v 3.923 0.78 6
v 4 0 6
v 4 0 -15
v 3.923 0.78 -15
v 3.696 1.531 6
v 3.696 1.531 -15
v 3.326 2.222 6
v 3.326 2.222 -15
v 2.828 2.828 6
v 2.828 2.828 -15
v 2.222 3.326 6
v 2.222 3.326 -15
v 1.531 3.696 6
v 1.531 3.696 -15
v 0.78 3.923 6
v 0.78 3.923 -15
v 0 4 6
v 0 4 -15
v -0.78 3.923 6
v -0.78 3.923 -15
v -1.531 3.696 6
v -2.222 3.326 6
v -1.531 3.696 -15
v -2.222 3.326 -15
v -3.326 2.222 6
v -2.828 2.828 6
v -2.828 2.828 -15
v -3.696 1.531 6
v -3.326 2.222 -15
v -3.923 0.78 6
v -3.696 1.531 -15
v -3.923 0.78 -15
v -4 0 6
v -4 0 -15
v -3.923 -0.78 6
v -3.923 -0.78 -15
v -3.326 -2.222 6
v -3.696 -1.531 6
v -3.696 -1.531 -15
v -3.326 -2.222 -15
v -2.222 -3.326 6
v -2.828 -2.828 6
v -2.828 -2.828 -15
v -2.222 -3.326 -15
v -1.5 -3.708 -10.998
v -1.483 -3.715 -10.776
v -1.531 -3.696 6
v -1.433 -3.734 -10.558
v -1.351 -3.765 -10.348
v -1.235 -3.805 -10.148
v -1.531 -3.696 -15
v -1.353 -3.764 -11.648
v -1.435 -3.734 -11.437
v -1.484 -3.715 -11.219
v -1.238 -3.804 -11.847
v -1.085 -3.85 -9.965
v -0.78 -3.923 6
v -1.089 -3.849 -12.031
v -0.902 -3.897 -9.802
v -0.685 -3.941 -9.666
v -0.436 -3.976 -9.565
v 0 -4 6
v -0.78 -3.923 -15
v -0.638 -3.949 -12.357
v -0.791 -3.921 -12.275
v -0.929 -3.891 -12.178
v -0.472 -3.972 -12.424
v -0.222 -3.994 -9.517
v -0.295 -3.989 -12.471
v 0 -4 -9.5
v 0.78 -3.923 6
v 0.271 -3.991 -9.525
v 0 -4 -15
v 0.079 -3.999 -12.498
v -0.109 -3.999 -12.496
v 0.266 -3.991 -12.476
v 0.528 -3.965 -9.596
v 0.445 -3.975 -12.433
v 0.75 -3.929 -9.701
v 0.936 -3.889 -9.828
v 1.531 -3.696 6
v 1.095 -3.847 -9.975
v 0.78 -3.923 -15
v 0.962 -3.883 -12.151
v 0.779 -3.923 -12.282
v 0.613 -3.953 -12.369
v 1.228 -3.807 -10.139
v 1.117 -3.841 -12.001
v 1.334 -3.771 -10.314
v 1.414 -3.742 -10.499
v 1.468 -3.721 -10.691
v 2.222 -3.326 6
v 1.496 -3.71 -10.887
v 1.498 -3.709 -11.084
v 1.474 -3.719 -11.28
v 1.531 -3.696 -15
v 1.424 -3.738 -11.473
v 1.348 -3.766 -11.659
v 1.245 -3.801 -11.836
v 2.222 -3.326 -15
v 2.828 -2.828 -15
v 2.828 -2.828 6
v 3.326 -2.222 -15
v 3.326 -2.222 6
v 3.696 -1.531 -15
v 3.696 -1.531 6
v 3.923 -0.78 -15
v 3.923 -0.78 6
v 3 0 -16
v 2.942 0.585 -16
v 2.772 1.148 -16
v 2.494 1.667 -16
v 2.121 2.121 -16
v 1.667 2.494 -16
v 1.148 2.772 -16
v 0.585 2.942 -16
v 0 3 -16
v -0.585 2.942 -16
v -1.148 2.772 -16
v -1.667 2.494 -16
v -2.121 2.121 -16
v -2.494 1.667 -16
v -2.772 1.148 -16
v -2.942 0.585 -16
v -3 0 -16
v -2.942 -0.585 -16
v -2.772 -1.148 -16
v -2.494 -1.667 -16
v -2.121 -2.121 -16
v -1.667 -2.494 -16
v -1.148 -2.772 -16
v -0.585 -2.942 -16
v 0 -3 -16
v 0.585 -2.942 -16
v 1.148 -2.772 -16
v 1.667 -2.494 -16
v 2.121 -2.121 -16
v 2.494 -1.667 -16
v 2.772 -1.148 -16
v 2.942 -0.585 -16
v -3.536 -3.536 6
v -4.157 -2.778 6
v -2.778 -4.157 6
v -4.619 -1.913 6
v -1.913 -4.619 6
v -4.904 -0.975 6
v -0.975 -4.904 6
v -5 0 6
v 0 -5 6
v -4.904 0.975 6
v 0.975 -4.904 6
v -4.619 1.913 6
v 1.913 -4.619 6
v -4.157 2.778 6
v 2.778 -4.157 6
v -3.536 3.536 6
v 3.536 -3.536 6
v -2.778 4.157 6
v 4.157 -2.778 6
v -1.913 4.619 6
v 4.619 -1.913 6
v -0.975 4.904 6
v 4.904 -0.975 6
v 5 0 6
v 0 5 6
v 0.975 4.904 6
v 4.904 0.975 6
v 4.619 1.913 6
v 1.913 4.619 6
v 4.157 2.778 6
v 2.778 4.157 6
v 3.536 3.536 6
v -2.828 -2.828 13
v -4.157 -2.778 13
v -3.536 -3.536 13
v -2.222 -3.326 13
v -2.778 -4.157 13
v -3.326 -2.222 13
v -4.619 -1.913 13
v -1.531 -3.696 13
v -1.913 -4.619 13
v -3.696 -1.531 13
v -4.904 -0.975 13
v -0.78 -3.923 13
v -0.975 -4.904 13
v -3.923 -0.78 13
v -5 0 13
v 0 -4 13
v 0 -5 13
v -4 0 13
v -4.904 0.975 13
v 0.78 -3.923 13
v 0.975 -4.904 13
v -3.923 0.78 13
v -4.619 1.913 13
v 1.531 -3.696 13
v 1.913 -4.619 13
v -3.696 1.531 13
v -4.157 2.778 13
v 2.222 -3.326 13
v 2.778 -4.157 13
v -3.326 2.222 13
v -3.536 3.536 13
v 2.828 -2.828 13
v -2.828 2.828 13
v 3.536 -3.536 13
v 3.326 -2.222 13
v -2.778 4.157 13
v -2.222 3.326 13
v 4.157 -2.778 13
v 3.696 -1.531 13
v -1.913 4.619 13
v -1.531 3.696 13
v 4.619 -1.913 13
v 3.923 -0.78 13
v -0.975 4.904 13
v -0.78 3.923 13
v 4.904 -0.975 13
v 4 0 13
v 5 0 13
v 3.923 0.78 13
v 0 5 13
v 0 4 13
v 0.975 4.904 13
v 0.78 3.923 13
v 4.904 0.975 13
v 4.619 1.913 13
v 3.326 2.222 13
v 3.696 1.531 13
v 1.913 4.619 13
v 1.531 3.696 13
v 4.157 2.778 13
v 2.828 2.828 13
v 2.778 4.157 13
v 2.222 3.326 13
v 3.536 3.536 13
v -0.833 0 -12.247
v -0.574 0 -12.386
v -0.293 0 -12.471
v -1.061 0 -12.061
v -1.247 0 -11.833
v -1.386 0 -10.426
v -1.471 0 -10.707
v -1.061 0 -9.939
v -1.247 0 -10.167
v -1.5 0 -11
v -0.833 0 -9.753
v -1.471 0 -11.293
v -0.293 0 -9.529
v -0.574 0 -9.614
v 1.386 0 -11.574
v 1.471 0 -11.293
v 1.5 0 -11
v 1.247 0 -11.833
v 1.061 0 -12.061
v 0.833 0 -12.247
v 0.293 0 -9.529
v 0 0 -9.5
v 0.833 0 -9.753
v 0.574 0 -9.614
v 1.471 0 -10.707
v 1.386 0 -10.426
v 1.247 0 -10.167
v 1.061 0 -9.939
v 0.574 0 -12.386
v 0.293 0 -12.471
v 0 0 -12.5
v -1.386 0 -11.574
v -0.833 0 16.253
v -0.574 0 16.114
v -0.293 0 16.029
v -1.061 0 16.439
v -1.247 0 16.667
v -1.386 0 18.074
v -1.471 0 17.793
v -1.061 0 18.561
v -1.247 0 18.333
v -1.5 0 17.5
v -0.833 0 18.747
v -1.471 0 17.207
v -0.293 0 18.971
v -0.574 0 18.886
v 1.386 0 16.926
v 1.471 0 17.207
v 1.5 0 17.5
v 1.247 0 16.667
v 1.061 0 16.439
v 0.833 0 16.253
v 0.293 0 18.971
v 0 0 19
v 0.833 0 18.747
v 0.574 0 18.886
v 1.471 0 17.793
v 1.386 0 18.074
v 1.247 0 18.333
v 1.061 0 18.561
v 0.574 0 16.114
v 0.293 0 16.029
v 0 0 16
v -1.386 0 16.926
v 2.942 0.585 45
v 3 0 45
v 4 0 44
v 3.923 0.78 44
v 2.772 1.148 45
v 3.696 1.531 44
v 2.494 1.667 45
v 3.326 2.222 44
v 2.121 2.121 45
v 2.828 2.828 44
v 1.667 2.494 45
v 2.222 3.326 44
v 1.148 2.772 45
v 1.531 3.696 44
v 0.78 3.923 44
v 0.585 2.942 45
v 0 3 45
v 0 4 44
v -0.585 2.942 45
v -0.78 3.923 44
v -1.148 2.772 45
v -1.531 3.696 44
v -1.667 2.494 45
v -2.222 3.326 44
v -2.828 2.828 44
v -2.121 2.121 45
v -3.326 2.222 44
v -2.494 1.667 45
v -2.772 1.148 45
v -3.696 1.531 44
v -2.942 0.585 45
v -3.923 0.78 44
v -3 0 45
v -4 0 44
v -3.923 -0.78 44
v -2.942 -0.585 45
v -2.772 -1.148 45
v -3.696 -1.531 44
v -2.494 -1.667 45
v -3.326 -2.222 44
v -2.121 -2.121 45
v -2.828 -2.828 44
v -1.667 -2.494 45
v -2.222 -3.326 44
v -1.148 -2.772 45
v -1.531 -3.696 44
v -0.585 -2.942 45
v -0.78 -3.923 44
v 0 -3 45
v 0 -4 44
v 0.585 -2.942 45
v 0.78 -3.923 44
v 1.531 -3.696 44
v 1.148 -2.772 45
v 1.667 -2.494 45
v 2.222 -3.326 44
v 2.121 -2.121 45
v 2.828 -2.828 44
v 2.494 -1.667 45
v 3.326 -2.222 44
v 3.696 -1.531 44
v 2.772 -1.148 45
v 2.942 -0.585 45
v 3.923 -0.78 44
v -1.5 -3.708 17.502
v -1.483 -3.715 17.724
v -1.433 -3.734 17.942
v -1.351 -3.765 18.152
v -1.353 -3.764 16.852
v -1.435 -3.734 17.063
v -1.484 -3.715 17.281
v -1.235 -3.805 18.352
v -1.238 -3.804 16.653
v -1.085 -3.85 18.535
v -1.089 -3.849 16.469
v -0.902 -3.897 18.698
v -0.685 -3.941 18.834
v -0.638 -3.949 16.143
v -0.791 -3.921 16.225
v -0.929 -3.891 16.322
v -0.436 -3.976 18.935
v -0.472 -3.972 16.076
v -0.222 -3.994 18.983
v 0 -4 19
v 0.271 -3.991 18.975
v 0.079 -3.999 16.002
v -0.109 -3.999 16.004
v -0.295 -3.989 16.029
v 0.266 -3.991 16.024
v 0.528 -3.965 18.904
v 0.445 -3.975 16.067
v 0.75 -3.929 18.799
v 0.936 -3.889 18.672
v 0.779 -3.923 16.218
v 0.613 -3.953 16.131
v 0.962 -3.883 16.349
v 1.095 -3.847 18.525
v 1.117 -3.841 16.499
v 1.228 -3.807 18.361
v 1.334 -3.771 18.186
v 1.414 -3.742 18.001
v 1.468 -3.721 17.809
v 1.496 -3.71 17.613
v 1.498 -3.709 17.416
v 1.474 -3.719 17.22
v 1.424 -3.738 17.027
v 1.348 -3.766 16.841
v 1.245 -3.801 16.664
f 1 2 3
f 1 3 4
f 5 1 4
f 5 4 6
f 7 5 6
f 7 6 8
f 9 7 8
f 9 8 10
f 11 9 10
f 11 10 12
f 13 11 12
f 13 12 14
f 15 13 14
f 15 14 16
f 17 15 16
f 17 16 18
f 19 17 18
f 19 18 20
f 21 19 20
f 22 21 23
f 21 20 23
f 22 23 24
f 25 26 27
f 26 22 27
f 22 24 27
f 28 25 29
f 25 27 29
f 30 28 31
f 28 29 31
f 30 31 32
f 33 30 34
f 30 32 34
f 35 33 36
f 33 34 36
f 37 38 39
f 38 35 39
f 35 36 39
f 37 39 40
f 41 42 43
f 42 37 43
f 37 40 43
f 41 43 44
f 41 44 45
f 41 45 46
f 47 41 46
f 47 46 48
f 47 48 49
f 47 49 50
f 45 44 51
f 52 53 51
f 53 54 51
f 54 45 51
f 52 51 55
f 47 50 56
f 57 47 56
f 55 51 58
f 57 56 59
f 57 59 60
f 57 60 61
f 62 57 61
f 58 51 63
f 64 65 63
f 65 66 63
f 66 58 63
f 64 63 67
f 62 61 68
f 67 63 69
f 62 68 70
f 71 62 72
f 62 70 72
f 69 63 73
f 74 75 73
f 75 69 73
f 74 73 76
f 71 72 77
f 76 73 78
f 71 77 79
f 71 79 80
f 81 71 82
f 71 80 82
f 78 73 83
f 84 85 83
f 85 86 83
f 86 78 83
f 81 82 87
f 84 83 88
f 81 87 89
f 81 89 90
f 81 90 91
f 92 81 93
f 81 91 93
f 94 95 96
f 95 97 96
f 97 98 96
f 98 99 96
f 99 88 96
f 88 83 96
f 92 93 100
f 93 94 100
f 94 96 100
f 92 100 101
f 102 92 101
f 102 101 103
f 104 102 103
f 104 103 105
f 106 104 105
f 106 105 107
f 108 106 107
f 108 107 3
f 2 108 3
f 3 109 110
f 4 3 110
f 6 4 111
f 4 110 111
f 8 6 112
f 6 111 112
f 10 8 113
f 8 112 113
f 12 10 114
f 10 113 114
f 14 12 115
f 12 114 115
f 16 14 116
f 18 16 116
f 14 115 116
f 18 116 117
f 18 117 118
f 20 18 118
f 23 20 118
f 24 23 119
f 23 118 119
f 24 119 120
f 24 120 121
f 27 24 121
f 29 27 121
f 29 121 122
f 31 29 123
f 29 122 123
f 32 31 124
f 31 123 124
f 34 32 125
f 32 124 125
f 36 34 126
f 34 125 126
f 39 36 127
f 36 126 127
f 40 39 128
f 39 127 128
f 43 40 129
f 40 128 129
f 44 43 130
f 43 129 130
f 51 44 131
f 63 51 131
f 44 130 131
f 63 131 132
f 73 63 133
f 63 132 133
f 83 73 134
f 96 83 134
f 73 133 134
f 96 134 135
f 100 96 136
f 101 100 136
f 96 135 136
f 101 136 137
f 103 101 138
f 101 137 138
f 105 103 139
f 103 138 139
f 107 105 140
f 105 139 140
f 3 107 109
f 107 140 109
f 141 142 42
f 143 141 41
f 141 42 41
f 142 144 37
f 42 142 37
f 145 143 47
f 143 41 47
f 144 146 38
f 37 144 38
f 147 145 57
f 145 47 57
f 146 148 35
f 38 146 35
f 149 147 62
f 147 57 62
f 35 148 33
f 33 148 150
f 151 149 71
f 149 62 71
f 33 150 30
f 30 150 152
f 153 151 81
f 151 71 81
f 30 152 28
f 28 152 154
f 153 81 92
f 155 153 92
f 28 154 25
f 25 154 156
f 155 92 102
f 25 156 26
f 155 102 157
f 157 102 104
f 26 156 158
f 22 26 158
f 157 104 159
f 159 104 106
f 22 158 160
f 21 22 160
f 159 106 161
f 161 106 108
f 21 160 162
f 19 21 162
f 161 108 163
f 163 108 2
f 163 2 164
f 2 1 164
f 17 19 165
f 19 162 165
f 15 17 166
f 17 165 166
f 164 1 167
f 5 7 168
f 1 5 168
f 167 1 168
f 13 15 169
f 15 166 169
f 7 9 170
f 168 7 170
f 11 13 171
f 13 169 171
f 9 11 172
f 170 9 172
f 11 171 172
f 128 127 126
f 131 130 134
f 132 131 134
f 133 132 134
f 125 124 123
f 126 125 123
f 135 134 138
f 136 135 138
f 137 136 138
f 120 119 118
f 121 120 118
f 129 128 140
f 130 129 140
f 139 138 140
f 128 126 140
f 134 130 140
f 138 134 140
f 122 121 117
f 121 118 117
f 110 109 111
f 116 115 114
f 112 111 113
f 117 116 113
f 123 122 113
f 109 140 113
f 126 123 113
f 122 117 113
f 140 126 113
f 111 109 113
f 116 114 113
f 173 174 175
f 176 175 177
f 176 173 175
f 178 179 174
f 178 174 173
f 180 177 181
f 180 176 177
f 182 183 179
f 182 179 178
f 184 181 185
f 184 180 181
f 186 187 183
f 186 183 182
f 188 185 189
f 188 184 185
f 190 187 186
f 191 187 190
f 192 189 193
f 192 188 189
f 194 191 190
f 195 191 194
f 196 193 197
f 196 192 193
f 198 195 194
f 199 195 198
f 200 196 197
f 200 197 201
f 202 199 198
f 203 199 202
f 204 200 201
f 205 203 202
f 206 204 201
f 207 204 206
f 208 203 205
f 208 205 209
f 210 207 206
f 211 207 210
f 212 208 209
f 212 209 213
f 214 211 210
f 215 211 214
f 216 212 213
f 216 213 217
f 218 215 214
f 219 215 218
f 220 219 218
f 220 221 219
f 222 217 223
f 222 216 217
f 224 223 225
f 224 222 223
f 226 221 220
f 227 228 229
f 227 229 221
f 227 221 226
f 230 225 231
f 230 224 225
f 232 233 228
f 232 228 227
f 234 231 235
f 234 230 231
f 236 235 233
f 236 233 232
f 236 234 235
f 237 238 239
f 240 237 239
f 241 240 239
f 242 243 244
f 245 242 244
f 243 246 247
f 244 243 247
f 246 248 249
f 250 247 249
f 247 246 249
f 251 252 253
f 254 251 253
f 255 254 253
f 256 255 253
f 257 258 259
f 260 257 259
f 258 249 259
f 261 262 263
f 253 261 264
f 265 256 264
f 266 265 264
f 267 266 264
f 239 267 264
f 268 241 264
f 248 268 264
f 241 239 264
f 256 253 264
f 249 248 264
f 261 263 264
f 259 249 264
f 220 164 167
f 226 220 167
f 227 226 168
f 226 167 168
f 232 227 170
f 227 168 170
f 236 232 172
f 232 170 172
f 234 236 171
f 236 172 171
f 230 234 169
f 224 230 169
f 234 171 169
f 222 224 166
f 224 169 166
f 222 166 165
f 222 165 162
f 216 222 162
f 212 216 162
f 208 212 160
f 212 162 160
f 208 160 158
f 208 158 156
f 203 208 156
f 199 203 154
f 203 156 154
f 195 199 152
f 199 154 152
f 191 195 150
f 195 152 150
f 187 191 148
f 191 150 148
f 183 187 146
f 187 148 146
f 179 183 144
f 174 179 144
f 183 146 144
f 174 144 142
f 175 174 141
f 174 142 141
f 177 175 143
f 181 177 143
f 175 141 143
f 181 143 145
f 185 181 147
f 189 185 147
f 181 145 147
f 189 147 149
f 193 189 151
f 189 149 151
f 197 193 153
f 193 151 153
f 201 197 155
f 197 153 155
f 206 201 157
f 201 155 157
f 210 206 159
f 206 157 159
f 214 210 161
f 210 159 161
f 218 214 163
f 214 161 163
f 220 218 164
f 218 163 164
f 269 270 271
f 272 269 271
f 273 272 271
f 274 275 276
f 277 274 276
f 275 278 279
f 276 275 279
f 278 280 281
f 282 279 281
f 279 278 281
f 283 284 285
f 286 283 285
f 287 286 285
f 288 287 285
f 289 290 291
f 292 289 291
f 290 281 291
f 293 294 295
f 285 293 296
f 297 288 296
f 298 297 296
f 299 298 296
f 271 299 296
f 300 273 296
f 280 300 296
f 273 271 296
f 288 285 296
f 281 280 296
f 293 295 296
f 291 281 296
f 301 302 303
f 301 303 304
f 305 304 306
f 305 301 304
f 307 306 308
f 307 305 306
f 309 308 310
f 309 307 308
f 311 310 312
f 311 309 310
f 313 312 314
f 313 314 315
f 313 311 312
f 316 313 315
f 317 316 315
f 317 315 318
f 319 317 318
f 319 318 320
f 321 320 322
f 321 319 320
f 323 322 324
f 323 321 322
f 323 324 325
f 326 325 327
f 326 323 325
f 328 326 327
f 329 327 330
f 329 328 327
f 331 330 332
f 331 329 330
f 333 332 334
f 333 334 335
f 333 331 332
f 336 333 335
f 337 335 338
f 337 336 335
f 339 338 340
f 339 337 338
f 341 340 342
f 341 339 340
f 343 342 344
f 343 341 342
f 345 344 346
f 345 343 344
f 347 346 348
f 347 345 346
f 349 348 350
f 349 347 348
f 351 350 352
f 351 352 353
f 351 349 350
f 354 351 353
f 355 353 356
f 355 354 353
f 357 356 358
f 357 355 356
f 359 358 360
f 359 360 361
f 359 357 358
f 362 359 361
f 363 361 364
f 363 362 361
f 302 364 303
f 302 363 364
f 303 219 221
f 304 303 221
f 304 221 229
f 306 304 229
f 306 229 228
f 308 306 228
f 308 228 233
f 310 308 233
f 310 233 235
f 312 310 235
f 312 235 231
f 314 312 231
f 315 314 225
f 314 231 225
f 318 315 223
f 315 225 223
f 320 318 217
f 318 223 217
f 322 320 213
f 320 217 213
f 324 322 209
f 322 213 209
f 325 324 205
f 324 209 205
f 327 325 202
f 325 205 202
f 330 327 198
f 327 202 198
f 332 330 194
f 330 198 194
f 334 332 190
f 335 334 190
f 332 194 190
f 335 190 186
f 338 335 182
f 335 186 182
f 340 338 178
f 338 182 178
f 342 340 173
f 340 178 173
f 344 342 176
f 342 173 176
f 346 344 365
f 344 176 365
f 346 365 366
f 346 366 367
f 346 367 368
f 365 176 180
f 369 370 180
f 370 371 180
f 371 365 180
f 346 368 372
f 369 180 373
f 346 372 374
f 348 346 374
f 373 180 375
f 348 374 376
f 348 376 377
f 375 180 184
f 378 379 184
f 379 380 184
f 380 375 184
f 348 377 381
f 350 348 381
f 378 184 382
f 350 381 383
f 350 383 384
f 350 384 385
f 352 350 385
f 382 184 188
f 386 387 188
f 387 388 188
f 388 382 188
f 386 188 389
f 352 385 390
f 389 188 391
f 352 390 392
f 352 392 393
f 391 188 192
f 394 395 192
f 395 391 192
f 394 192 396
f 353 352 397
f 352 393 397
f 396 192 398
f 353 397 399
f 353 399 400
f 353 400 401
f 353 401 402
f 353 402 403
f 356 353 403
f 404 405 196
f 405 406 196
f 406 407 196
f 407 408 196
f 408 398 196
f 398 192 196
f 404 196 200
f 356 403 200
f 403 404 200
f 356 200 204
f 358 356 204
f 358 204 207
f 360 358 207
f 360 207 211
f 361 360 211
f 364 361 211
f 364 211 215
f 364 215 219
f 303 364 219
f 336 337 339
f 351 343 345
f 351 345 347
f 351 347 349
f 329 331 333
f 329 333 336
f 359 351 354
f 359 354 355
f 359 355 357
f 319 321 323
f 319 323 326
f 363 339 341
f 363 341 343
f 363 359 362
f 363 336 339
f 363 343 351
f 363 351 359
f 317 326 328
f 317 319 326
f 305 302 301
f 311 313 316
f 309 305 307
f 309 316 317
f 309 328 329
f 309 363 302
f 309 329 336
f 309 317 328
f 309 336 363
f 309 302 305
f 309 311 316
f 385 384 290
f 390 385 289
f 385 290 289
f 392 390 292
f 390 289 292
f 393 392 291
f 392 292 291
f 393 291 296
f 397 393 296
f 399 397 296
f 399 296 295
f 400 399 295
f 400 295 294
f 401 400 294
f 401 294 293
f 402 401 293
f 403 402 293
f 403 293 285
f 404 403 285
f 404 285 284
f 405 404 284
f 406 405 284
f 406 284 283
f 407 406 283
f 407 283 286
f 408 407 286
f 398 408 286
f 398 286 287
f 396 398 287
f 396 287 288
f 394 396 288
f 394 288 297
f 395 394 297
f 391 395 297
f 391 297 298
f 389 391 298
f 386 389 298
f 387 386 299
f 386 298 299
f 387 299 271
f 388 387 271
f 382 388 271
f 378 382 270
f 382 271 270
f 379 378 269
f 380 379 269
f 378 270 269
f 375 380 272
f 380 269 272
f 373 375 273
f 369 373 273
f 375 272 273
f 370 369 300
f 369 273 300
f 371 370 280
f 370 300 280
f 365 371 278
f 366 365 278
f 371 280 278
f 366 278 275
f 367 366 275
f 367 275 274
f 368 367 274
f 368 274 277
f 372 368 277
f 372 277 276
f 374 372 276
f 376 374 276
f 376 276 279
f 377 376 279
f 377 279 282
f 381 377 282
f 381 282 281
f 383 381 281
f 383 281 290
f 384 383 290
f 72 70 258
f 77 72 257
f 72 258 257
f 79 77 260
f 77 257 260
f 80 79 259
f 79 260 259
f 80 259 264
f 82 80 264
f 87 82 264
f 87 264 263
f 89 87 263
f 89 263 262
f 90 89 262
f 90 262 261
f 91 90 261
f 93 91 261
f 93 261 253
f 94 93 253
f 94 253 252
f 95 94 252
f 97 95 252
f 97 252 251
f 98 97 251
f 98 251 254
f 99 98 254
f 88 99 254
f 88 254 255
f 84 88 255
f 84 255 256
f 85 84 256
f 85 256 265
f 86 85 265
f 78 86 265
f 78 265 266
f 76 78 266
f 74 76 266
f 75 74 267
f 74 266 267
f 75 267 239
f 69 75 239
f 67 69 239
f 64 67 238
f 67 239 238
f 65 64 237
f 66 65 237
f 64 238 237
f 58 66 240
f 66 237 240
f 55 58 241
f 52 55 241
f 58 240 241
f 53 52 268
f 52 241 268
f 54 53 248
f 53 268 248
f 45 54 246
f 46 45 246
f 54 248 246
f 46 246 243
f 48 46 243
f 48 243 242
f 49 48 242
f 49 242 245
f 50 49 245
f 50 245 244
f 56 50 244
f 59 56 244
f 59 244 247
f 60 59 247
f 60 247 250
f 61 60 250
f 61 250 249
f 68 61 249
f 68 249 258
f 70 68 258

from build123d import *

# Parameters (mm, degrees)
EXTRUDE_1_DEPTH      = 45
EXTRUDE_1_DEPTH_BACK = 16
SKETCH_1_R           = 4
SKETCH_3_R           = 1.5
CUT_EXTRUDE_1_DEPTH  = 10
CHAMFER_1_SIZE       = 1
EXTRUDE_START        = -39
SKETCH_5_R           = 5
EXTRUDE_3_DEPTH      = 7
SKETCH_8_R           = 1.5
CUT_EXTRUDE_2_DEPTH  = 10
CHAMFER_2_SIZE       = 1


with BuildPart() as part:
    # 草图1 → 凸台-拉伸1 (new, two sides: drawn at the far end of the back side and taken through both)
    with BuildSketch(Plane.XY.offset(-EXTRUDE_1_DEPTH_BACK)):
        Circle(SKETCH_1_R)
    extrude(amount=EXTRUDE_1_DEPTH + EXTRUDE_1_DEPTH_BACK)

    # 草图3 → 切除-拉伸1 (cut)
    with BuildSketch(Plane(origin=(0, 0, 0), x_dir=(1, 0, 0), z_dir=(0, 1, 0))):
        with Locations((0, -17.5)):
            Circle(SKETCH_3_R)
    extrude(amount=-CUT_EXTRUDE_1_DEPTH, mode=Mode.SUBTRACT)

    # 倒角1
    chamfer_1_edges = [part.edges().sort_by_distance(p)[0] for p in [
        (-4, 0, 45),
    ]]
    chamfer(chamfer_1_edges, length=CHAMFER_1_SIZE)

    # 草图5 → 凸台-拉伸3 (add)
    with BuildSketch(Plane.XY.offset(45).offset(EXTRUDE_START)):
        Circle(SKETCH_5_R)
    extrude(amount=EXTRUDE_3_DEPTH)

    # 草图8 → 切除-拉伸2 (cut)
    with BuildSketch(Plane(origin=(0, 0, 0), x_dir=(1, 0, 0), z_dir=(0, 1, 0))):
        with Locations((0, 11)):
            Circle(SKETCH_8_R)
    extrude(amount=-CUT_EXTRUDE_2_DEPTH, mode=Mode.SUBTRACT)

    # 倒角2
    chamfer_2_edges = [part.edges().sort_by_distance(p)[0] for p in [
        (-4, 0, -16),
    ]]
    chamfer(chamfer_2_edges, length=CHAMFER_2_SIZE)


solid = part.part
